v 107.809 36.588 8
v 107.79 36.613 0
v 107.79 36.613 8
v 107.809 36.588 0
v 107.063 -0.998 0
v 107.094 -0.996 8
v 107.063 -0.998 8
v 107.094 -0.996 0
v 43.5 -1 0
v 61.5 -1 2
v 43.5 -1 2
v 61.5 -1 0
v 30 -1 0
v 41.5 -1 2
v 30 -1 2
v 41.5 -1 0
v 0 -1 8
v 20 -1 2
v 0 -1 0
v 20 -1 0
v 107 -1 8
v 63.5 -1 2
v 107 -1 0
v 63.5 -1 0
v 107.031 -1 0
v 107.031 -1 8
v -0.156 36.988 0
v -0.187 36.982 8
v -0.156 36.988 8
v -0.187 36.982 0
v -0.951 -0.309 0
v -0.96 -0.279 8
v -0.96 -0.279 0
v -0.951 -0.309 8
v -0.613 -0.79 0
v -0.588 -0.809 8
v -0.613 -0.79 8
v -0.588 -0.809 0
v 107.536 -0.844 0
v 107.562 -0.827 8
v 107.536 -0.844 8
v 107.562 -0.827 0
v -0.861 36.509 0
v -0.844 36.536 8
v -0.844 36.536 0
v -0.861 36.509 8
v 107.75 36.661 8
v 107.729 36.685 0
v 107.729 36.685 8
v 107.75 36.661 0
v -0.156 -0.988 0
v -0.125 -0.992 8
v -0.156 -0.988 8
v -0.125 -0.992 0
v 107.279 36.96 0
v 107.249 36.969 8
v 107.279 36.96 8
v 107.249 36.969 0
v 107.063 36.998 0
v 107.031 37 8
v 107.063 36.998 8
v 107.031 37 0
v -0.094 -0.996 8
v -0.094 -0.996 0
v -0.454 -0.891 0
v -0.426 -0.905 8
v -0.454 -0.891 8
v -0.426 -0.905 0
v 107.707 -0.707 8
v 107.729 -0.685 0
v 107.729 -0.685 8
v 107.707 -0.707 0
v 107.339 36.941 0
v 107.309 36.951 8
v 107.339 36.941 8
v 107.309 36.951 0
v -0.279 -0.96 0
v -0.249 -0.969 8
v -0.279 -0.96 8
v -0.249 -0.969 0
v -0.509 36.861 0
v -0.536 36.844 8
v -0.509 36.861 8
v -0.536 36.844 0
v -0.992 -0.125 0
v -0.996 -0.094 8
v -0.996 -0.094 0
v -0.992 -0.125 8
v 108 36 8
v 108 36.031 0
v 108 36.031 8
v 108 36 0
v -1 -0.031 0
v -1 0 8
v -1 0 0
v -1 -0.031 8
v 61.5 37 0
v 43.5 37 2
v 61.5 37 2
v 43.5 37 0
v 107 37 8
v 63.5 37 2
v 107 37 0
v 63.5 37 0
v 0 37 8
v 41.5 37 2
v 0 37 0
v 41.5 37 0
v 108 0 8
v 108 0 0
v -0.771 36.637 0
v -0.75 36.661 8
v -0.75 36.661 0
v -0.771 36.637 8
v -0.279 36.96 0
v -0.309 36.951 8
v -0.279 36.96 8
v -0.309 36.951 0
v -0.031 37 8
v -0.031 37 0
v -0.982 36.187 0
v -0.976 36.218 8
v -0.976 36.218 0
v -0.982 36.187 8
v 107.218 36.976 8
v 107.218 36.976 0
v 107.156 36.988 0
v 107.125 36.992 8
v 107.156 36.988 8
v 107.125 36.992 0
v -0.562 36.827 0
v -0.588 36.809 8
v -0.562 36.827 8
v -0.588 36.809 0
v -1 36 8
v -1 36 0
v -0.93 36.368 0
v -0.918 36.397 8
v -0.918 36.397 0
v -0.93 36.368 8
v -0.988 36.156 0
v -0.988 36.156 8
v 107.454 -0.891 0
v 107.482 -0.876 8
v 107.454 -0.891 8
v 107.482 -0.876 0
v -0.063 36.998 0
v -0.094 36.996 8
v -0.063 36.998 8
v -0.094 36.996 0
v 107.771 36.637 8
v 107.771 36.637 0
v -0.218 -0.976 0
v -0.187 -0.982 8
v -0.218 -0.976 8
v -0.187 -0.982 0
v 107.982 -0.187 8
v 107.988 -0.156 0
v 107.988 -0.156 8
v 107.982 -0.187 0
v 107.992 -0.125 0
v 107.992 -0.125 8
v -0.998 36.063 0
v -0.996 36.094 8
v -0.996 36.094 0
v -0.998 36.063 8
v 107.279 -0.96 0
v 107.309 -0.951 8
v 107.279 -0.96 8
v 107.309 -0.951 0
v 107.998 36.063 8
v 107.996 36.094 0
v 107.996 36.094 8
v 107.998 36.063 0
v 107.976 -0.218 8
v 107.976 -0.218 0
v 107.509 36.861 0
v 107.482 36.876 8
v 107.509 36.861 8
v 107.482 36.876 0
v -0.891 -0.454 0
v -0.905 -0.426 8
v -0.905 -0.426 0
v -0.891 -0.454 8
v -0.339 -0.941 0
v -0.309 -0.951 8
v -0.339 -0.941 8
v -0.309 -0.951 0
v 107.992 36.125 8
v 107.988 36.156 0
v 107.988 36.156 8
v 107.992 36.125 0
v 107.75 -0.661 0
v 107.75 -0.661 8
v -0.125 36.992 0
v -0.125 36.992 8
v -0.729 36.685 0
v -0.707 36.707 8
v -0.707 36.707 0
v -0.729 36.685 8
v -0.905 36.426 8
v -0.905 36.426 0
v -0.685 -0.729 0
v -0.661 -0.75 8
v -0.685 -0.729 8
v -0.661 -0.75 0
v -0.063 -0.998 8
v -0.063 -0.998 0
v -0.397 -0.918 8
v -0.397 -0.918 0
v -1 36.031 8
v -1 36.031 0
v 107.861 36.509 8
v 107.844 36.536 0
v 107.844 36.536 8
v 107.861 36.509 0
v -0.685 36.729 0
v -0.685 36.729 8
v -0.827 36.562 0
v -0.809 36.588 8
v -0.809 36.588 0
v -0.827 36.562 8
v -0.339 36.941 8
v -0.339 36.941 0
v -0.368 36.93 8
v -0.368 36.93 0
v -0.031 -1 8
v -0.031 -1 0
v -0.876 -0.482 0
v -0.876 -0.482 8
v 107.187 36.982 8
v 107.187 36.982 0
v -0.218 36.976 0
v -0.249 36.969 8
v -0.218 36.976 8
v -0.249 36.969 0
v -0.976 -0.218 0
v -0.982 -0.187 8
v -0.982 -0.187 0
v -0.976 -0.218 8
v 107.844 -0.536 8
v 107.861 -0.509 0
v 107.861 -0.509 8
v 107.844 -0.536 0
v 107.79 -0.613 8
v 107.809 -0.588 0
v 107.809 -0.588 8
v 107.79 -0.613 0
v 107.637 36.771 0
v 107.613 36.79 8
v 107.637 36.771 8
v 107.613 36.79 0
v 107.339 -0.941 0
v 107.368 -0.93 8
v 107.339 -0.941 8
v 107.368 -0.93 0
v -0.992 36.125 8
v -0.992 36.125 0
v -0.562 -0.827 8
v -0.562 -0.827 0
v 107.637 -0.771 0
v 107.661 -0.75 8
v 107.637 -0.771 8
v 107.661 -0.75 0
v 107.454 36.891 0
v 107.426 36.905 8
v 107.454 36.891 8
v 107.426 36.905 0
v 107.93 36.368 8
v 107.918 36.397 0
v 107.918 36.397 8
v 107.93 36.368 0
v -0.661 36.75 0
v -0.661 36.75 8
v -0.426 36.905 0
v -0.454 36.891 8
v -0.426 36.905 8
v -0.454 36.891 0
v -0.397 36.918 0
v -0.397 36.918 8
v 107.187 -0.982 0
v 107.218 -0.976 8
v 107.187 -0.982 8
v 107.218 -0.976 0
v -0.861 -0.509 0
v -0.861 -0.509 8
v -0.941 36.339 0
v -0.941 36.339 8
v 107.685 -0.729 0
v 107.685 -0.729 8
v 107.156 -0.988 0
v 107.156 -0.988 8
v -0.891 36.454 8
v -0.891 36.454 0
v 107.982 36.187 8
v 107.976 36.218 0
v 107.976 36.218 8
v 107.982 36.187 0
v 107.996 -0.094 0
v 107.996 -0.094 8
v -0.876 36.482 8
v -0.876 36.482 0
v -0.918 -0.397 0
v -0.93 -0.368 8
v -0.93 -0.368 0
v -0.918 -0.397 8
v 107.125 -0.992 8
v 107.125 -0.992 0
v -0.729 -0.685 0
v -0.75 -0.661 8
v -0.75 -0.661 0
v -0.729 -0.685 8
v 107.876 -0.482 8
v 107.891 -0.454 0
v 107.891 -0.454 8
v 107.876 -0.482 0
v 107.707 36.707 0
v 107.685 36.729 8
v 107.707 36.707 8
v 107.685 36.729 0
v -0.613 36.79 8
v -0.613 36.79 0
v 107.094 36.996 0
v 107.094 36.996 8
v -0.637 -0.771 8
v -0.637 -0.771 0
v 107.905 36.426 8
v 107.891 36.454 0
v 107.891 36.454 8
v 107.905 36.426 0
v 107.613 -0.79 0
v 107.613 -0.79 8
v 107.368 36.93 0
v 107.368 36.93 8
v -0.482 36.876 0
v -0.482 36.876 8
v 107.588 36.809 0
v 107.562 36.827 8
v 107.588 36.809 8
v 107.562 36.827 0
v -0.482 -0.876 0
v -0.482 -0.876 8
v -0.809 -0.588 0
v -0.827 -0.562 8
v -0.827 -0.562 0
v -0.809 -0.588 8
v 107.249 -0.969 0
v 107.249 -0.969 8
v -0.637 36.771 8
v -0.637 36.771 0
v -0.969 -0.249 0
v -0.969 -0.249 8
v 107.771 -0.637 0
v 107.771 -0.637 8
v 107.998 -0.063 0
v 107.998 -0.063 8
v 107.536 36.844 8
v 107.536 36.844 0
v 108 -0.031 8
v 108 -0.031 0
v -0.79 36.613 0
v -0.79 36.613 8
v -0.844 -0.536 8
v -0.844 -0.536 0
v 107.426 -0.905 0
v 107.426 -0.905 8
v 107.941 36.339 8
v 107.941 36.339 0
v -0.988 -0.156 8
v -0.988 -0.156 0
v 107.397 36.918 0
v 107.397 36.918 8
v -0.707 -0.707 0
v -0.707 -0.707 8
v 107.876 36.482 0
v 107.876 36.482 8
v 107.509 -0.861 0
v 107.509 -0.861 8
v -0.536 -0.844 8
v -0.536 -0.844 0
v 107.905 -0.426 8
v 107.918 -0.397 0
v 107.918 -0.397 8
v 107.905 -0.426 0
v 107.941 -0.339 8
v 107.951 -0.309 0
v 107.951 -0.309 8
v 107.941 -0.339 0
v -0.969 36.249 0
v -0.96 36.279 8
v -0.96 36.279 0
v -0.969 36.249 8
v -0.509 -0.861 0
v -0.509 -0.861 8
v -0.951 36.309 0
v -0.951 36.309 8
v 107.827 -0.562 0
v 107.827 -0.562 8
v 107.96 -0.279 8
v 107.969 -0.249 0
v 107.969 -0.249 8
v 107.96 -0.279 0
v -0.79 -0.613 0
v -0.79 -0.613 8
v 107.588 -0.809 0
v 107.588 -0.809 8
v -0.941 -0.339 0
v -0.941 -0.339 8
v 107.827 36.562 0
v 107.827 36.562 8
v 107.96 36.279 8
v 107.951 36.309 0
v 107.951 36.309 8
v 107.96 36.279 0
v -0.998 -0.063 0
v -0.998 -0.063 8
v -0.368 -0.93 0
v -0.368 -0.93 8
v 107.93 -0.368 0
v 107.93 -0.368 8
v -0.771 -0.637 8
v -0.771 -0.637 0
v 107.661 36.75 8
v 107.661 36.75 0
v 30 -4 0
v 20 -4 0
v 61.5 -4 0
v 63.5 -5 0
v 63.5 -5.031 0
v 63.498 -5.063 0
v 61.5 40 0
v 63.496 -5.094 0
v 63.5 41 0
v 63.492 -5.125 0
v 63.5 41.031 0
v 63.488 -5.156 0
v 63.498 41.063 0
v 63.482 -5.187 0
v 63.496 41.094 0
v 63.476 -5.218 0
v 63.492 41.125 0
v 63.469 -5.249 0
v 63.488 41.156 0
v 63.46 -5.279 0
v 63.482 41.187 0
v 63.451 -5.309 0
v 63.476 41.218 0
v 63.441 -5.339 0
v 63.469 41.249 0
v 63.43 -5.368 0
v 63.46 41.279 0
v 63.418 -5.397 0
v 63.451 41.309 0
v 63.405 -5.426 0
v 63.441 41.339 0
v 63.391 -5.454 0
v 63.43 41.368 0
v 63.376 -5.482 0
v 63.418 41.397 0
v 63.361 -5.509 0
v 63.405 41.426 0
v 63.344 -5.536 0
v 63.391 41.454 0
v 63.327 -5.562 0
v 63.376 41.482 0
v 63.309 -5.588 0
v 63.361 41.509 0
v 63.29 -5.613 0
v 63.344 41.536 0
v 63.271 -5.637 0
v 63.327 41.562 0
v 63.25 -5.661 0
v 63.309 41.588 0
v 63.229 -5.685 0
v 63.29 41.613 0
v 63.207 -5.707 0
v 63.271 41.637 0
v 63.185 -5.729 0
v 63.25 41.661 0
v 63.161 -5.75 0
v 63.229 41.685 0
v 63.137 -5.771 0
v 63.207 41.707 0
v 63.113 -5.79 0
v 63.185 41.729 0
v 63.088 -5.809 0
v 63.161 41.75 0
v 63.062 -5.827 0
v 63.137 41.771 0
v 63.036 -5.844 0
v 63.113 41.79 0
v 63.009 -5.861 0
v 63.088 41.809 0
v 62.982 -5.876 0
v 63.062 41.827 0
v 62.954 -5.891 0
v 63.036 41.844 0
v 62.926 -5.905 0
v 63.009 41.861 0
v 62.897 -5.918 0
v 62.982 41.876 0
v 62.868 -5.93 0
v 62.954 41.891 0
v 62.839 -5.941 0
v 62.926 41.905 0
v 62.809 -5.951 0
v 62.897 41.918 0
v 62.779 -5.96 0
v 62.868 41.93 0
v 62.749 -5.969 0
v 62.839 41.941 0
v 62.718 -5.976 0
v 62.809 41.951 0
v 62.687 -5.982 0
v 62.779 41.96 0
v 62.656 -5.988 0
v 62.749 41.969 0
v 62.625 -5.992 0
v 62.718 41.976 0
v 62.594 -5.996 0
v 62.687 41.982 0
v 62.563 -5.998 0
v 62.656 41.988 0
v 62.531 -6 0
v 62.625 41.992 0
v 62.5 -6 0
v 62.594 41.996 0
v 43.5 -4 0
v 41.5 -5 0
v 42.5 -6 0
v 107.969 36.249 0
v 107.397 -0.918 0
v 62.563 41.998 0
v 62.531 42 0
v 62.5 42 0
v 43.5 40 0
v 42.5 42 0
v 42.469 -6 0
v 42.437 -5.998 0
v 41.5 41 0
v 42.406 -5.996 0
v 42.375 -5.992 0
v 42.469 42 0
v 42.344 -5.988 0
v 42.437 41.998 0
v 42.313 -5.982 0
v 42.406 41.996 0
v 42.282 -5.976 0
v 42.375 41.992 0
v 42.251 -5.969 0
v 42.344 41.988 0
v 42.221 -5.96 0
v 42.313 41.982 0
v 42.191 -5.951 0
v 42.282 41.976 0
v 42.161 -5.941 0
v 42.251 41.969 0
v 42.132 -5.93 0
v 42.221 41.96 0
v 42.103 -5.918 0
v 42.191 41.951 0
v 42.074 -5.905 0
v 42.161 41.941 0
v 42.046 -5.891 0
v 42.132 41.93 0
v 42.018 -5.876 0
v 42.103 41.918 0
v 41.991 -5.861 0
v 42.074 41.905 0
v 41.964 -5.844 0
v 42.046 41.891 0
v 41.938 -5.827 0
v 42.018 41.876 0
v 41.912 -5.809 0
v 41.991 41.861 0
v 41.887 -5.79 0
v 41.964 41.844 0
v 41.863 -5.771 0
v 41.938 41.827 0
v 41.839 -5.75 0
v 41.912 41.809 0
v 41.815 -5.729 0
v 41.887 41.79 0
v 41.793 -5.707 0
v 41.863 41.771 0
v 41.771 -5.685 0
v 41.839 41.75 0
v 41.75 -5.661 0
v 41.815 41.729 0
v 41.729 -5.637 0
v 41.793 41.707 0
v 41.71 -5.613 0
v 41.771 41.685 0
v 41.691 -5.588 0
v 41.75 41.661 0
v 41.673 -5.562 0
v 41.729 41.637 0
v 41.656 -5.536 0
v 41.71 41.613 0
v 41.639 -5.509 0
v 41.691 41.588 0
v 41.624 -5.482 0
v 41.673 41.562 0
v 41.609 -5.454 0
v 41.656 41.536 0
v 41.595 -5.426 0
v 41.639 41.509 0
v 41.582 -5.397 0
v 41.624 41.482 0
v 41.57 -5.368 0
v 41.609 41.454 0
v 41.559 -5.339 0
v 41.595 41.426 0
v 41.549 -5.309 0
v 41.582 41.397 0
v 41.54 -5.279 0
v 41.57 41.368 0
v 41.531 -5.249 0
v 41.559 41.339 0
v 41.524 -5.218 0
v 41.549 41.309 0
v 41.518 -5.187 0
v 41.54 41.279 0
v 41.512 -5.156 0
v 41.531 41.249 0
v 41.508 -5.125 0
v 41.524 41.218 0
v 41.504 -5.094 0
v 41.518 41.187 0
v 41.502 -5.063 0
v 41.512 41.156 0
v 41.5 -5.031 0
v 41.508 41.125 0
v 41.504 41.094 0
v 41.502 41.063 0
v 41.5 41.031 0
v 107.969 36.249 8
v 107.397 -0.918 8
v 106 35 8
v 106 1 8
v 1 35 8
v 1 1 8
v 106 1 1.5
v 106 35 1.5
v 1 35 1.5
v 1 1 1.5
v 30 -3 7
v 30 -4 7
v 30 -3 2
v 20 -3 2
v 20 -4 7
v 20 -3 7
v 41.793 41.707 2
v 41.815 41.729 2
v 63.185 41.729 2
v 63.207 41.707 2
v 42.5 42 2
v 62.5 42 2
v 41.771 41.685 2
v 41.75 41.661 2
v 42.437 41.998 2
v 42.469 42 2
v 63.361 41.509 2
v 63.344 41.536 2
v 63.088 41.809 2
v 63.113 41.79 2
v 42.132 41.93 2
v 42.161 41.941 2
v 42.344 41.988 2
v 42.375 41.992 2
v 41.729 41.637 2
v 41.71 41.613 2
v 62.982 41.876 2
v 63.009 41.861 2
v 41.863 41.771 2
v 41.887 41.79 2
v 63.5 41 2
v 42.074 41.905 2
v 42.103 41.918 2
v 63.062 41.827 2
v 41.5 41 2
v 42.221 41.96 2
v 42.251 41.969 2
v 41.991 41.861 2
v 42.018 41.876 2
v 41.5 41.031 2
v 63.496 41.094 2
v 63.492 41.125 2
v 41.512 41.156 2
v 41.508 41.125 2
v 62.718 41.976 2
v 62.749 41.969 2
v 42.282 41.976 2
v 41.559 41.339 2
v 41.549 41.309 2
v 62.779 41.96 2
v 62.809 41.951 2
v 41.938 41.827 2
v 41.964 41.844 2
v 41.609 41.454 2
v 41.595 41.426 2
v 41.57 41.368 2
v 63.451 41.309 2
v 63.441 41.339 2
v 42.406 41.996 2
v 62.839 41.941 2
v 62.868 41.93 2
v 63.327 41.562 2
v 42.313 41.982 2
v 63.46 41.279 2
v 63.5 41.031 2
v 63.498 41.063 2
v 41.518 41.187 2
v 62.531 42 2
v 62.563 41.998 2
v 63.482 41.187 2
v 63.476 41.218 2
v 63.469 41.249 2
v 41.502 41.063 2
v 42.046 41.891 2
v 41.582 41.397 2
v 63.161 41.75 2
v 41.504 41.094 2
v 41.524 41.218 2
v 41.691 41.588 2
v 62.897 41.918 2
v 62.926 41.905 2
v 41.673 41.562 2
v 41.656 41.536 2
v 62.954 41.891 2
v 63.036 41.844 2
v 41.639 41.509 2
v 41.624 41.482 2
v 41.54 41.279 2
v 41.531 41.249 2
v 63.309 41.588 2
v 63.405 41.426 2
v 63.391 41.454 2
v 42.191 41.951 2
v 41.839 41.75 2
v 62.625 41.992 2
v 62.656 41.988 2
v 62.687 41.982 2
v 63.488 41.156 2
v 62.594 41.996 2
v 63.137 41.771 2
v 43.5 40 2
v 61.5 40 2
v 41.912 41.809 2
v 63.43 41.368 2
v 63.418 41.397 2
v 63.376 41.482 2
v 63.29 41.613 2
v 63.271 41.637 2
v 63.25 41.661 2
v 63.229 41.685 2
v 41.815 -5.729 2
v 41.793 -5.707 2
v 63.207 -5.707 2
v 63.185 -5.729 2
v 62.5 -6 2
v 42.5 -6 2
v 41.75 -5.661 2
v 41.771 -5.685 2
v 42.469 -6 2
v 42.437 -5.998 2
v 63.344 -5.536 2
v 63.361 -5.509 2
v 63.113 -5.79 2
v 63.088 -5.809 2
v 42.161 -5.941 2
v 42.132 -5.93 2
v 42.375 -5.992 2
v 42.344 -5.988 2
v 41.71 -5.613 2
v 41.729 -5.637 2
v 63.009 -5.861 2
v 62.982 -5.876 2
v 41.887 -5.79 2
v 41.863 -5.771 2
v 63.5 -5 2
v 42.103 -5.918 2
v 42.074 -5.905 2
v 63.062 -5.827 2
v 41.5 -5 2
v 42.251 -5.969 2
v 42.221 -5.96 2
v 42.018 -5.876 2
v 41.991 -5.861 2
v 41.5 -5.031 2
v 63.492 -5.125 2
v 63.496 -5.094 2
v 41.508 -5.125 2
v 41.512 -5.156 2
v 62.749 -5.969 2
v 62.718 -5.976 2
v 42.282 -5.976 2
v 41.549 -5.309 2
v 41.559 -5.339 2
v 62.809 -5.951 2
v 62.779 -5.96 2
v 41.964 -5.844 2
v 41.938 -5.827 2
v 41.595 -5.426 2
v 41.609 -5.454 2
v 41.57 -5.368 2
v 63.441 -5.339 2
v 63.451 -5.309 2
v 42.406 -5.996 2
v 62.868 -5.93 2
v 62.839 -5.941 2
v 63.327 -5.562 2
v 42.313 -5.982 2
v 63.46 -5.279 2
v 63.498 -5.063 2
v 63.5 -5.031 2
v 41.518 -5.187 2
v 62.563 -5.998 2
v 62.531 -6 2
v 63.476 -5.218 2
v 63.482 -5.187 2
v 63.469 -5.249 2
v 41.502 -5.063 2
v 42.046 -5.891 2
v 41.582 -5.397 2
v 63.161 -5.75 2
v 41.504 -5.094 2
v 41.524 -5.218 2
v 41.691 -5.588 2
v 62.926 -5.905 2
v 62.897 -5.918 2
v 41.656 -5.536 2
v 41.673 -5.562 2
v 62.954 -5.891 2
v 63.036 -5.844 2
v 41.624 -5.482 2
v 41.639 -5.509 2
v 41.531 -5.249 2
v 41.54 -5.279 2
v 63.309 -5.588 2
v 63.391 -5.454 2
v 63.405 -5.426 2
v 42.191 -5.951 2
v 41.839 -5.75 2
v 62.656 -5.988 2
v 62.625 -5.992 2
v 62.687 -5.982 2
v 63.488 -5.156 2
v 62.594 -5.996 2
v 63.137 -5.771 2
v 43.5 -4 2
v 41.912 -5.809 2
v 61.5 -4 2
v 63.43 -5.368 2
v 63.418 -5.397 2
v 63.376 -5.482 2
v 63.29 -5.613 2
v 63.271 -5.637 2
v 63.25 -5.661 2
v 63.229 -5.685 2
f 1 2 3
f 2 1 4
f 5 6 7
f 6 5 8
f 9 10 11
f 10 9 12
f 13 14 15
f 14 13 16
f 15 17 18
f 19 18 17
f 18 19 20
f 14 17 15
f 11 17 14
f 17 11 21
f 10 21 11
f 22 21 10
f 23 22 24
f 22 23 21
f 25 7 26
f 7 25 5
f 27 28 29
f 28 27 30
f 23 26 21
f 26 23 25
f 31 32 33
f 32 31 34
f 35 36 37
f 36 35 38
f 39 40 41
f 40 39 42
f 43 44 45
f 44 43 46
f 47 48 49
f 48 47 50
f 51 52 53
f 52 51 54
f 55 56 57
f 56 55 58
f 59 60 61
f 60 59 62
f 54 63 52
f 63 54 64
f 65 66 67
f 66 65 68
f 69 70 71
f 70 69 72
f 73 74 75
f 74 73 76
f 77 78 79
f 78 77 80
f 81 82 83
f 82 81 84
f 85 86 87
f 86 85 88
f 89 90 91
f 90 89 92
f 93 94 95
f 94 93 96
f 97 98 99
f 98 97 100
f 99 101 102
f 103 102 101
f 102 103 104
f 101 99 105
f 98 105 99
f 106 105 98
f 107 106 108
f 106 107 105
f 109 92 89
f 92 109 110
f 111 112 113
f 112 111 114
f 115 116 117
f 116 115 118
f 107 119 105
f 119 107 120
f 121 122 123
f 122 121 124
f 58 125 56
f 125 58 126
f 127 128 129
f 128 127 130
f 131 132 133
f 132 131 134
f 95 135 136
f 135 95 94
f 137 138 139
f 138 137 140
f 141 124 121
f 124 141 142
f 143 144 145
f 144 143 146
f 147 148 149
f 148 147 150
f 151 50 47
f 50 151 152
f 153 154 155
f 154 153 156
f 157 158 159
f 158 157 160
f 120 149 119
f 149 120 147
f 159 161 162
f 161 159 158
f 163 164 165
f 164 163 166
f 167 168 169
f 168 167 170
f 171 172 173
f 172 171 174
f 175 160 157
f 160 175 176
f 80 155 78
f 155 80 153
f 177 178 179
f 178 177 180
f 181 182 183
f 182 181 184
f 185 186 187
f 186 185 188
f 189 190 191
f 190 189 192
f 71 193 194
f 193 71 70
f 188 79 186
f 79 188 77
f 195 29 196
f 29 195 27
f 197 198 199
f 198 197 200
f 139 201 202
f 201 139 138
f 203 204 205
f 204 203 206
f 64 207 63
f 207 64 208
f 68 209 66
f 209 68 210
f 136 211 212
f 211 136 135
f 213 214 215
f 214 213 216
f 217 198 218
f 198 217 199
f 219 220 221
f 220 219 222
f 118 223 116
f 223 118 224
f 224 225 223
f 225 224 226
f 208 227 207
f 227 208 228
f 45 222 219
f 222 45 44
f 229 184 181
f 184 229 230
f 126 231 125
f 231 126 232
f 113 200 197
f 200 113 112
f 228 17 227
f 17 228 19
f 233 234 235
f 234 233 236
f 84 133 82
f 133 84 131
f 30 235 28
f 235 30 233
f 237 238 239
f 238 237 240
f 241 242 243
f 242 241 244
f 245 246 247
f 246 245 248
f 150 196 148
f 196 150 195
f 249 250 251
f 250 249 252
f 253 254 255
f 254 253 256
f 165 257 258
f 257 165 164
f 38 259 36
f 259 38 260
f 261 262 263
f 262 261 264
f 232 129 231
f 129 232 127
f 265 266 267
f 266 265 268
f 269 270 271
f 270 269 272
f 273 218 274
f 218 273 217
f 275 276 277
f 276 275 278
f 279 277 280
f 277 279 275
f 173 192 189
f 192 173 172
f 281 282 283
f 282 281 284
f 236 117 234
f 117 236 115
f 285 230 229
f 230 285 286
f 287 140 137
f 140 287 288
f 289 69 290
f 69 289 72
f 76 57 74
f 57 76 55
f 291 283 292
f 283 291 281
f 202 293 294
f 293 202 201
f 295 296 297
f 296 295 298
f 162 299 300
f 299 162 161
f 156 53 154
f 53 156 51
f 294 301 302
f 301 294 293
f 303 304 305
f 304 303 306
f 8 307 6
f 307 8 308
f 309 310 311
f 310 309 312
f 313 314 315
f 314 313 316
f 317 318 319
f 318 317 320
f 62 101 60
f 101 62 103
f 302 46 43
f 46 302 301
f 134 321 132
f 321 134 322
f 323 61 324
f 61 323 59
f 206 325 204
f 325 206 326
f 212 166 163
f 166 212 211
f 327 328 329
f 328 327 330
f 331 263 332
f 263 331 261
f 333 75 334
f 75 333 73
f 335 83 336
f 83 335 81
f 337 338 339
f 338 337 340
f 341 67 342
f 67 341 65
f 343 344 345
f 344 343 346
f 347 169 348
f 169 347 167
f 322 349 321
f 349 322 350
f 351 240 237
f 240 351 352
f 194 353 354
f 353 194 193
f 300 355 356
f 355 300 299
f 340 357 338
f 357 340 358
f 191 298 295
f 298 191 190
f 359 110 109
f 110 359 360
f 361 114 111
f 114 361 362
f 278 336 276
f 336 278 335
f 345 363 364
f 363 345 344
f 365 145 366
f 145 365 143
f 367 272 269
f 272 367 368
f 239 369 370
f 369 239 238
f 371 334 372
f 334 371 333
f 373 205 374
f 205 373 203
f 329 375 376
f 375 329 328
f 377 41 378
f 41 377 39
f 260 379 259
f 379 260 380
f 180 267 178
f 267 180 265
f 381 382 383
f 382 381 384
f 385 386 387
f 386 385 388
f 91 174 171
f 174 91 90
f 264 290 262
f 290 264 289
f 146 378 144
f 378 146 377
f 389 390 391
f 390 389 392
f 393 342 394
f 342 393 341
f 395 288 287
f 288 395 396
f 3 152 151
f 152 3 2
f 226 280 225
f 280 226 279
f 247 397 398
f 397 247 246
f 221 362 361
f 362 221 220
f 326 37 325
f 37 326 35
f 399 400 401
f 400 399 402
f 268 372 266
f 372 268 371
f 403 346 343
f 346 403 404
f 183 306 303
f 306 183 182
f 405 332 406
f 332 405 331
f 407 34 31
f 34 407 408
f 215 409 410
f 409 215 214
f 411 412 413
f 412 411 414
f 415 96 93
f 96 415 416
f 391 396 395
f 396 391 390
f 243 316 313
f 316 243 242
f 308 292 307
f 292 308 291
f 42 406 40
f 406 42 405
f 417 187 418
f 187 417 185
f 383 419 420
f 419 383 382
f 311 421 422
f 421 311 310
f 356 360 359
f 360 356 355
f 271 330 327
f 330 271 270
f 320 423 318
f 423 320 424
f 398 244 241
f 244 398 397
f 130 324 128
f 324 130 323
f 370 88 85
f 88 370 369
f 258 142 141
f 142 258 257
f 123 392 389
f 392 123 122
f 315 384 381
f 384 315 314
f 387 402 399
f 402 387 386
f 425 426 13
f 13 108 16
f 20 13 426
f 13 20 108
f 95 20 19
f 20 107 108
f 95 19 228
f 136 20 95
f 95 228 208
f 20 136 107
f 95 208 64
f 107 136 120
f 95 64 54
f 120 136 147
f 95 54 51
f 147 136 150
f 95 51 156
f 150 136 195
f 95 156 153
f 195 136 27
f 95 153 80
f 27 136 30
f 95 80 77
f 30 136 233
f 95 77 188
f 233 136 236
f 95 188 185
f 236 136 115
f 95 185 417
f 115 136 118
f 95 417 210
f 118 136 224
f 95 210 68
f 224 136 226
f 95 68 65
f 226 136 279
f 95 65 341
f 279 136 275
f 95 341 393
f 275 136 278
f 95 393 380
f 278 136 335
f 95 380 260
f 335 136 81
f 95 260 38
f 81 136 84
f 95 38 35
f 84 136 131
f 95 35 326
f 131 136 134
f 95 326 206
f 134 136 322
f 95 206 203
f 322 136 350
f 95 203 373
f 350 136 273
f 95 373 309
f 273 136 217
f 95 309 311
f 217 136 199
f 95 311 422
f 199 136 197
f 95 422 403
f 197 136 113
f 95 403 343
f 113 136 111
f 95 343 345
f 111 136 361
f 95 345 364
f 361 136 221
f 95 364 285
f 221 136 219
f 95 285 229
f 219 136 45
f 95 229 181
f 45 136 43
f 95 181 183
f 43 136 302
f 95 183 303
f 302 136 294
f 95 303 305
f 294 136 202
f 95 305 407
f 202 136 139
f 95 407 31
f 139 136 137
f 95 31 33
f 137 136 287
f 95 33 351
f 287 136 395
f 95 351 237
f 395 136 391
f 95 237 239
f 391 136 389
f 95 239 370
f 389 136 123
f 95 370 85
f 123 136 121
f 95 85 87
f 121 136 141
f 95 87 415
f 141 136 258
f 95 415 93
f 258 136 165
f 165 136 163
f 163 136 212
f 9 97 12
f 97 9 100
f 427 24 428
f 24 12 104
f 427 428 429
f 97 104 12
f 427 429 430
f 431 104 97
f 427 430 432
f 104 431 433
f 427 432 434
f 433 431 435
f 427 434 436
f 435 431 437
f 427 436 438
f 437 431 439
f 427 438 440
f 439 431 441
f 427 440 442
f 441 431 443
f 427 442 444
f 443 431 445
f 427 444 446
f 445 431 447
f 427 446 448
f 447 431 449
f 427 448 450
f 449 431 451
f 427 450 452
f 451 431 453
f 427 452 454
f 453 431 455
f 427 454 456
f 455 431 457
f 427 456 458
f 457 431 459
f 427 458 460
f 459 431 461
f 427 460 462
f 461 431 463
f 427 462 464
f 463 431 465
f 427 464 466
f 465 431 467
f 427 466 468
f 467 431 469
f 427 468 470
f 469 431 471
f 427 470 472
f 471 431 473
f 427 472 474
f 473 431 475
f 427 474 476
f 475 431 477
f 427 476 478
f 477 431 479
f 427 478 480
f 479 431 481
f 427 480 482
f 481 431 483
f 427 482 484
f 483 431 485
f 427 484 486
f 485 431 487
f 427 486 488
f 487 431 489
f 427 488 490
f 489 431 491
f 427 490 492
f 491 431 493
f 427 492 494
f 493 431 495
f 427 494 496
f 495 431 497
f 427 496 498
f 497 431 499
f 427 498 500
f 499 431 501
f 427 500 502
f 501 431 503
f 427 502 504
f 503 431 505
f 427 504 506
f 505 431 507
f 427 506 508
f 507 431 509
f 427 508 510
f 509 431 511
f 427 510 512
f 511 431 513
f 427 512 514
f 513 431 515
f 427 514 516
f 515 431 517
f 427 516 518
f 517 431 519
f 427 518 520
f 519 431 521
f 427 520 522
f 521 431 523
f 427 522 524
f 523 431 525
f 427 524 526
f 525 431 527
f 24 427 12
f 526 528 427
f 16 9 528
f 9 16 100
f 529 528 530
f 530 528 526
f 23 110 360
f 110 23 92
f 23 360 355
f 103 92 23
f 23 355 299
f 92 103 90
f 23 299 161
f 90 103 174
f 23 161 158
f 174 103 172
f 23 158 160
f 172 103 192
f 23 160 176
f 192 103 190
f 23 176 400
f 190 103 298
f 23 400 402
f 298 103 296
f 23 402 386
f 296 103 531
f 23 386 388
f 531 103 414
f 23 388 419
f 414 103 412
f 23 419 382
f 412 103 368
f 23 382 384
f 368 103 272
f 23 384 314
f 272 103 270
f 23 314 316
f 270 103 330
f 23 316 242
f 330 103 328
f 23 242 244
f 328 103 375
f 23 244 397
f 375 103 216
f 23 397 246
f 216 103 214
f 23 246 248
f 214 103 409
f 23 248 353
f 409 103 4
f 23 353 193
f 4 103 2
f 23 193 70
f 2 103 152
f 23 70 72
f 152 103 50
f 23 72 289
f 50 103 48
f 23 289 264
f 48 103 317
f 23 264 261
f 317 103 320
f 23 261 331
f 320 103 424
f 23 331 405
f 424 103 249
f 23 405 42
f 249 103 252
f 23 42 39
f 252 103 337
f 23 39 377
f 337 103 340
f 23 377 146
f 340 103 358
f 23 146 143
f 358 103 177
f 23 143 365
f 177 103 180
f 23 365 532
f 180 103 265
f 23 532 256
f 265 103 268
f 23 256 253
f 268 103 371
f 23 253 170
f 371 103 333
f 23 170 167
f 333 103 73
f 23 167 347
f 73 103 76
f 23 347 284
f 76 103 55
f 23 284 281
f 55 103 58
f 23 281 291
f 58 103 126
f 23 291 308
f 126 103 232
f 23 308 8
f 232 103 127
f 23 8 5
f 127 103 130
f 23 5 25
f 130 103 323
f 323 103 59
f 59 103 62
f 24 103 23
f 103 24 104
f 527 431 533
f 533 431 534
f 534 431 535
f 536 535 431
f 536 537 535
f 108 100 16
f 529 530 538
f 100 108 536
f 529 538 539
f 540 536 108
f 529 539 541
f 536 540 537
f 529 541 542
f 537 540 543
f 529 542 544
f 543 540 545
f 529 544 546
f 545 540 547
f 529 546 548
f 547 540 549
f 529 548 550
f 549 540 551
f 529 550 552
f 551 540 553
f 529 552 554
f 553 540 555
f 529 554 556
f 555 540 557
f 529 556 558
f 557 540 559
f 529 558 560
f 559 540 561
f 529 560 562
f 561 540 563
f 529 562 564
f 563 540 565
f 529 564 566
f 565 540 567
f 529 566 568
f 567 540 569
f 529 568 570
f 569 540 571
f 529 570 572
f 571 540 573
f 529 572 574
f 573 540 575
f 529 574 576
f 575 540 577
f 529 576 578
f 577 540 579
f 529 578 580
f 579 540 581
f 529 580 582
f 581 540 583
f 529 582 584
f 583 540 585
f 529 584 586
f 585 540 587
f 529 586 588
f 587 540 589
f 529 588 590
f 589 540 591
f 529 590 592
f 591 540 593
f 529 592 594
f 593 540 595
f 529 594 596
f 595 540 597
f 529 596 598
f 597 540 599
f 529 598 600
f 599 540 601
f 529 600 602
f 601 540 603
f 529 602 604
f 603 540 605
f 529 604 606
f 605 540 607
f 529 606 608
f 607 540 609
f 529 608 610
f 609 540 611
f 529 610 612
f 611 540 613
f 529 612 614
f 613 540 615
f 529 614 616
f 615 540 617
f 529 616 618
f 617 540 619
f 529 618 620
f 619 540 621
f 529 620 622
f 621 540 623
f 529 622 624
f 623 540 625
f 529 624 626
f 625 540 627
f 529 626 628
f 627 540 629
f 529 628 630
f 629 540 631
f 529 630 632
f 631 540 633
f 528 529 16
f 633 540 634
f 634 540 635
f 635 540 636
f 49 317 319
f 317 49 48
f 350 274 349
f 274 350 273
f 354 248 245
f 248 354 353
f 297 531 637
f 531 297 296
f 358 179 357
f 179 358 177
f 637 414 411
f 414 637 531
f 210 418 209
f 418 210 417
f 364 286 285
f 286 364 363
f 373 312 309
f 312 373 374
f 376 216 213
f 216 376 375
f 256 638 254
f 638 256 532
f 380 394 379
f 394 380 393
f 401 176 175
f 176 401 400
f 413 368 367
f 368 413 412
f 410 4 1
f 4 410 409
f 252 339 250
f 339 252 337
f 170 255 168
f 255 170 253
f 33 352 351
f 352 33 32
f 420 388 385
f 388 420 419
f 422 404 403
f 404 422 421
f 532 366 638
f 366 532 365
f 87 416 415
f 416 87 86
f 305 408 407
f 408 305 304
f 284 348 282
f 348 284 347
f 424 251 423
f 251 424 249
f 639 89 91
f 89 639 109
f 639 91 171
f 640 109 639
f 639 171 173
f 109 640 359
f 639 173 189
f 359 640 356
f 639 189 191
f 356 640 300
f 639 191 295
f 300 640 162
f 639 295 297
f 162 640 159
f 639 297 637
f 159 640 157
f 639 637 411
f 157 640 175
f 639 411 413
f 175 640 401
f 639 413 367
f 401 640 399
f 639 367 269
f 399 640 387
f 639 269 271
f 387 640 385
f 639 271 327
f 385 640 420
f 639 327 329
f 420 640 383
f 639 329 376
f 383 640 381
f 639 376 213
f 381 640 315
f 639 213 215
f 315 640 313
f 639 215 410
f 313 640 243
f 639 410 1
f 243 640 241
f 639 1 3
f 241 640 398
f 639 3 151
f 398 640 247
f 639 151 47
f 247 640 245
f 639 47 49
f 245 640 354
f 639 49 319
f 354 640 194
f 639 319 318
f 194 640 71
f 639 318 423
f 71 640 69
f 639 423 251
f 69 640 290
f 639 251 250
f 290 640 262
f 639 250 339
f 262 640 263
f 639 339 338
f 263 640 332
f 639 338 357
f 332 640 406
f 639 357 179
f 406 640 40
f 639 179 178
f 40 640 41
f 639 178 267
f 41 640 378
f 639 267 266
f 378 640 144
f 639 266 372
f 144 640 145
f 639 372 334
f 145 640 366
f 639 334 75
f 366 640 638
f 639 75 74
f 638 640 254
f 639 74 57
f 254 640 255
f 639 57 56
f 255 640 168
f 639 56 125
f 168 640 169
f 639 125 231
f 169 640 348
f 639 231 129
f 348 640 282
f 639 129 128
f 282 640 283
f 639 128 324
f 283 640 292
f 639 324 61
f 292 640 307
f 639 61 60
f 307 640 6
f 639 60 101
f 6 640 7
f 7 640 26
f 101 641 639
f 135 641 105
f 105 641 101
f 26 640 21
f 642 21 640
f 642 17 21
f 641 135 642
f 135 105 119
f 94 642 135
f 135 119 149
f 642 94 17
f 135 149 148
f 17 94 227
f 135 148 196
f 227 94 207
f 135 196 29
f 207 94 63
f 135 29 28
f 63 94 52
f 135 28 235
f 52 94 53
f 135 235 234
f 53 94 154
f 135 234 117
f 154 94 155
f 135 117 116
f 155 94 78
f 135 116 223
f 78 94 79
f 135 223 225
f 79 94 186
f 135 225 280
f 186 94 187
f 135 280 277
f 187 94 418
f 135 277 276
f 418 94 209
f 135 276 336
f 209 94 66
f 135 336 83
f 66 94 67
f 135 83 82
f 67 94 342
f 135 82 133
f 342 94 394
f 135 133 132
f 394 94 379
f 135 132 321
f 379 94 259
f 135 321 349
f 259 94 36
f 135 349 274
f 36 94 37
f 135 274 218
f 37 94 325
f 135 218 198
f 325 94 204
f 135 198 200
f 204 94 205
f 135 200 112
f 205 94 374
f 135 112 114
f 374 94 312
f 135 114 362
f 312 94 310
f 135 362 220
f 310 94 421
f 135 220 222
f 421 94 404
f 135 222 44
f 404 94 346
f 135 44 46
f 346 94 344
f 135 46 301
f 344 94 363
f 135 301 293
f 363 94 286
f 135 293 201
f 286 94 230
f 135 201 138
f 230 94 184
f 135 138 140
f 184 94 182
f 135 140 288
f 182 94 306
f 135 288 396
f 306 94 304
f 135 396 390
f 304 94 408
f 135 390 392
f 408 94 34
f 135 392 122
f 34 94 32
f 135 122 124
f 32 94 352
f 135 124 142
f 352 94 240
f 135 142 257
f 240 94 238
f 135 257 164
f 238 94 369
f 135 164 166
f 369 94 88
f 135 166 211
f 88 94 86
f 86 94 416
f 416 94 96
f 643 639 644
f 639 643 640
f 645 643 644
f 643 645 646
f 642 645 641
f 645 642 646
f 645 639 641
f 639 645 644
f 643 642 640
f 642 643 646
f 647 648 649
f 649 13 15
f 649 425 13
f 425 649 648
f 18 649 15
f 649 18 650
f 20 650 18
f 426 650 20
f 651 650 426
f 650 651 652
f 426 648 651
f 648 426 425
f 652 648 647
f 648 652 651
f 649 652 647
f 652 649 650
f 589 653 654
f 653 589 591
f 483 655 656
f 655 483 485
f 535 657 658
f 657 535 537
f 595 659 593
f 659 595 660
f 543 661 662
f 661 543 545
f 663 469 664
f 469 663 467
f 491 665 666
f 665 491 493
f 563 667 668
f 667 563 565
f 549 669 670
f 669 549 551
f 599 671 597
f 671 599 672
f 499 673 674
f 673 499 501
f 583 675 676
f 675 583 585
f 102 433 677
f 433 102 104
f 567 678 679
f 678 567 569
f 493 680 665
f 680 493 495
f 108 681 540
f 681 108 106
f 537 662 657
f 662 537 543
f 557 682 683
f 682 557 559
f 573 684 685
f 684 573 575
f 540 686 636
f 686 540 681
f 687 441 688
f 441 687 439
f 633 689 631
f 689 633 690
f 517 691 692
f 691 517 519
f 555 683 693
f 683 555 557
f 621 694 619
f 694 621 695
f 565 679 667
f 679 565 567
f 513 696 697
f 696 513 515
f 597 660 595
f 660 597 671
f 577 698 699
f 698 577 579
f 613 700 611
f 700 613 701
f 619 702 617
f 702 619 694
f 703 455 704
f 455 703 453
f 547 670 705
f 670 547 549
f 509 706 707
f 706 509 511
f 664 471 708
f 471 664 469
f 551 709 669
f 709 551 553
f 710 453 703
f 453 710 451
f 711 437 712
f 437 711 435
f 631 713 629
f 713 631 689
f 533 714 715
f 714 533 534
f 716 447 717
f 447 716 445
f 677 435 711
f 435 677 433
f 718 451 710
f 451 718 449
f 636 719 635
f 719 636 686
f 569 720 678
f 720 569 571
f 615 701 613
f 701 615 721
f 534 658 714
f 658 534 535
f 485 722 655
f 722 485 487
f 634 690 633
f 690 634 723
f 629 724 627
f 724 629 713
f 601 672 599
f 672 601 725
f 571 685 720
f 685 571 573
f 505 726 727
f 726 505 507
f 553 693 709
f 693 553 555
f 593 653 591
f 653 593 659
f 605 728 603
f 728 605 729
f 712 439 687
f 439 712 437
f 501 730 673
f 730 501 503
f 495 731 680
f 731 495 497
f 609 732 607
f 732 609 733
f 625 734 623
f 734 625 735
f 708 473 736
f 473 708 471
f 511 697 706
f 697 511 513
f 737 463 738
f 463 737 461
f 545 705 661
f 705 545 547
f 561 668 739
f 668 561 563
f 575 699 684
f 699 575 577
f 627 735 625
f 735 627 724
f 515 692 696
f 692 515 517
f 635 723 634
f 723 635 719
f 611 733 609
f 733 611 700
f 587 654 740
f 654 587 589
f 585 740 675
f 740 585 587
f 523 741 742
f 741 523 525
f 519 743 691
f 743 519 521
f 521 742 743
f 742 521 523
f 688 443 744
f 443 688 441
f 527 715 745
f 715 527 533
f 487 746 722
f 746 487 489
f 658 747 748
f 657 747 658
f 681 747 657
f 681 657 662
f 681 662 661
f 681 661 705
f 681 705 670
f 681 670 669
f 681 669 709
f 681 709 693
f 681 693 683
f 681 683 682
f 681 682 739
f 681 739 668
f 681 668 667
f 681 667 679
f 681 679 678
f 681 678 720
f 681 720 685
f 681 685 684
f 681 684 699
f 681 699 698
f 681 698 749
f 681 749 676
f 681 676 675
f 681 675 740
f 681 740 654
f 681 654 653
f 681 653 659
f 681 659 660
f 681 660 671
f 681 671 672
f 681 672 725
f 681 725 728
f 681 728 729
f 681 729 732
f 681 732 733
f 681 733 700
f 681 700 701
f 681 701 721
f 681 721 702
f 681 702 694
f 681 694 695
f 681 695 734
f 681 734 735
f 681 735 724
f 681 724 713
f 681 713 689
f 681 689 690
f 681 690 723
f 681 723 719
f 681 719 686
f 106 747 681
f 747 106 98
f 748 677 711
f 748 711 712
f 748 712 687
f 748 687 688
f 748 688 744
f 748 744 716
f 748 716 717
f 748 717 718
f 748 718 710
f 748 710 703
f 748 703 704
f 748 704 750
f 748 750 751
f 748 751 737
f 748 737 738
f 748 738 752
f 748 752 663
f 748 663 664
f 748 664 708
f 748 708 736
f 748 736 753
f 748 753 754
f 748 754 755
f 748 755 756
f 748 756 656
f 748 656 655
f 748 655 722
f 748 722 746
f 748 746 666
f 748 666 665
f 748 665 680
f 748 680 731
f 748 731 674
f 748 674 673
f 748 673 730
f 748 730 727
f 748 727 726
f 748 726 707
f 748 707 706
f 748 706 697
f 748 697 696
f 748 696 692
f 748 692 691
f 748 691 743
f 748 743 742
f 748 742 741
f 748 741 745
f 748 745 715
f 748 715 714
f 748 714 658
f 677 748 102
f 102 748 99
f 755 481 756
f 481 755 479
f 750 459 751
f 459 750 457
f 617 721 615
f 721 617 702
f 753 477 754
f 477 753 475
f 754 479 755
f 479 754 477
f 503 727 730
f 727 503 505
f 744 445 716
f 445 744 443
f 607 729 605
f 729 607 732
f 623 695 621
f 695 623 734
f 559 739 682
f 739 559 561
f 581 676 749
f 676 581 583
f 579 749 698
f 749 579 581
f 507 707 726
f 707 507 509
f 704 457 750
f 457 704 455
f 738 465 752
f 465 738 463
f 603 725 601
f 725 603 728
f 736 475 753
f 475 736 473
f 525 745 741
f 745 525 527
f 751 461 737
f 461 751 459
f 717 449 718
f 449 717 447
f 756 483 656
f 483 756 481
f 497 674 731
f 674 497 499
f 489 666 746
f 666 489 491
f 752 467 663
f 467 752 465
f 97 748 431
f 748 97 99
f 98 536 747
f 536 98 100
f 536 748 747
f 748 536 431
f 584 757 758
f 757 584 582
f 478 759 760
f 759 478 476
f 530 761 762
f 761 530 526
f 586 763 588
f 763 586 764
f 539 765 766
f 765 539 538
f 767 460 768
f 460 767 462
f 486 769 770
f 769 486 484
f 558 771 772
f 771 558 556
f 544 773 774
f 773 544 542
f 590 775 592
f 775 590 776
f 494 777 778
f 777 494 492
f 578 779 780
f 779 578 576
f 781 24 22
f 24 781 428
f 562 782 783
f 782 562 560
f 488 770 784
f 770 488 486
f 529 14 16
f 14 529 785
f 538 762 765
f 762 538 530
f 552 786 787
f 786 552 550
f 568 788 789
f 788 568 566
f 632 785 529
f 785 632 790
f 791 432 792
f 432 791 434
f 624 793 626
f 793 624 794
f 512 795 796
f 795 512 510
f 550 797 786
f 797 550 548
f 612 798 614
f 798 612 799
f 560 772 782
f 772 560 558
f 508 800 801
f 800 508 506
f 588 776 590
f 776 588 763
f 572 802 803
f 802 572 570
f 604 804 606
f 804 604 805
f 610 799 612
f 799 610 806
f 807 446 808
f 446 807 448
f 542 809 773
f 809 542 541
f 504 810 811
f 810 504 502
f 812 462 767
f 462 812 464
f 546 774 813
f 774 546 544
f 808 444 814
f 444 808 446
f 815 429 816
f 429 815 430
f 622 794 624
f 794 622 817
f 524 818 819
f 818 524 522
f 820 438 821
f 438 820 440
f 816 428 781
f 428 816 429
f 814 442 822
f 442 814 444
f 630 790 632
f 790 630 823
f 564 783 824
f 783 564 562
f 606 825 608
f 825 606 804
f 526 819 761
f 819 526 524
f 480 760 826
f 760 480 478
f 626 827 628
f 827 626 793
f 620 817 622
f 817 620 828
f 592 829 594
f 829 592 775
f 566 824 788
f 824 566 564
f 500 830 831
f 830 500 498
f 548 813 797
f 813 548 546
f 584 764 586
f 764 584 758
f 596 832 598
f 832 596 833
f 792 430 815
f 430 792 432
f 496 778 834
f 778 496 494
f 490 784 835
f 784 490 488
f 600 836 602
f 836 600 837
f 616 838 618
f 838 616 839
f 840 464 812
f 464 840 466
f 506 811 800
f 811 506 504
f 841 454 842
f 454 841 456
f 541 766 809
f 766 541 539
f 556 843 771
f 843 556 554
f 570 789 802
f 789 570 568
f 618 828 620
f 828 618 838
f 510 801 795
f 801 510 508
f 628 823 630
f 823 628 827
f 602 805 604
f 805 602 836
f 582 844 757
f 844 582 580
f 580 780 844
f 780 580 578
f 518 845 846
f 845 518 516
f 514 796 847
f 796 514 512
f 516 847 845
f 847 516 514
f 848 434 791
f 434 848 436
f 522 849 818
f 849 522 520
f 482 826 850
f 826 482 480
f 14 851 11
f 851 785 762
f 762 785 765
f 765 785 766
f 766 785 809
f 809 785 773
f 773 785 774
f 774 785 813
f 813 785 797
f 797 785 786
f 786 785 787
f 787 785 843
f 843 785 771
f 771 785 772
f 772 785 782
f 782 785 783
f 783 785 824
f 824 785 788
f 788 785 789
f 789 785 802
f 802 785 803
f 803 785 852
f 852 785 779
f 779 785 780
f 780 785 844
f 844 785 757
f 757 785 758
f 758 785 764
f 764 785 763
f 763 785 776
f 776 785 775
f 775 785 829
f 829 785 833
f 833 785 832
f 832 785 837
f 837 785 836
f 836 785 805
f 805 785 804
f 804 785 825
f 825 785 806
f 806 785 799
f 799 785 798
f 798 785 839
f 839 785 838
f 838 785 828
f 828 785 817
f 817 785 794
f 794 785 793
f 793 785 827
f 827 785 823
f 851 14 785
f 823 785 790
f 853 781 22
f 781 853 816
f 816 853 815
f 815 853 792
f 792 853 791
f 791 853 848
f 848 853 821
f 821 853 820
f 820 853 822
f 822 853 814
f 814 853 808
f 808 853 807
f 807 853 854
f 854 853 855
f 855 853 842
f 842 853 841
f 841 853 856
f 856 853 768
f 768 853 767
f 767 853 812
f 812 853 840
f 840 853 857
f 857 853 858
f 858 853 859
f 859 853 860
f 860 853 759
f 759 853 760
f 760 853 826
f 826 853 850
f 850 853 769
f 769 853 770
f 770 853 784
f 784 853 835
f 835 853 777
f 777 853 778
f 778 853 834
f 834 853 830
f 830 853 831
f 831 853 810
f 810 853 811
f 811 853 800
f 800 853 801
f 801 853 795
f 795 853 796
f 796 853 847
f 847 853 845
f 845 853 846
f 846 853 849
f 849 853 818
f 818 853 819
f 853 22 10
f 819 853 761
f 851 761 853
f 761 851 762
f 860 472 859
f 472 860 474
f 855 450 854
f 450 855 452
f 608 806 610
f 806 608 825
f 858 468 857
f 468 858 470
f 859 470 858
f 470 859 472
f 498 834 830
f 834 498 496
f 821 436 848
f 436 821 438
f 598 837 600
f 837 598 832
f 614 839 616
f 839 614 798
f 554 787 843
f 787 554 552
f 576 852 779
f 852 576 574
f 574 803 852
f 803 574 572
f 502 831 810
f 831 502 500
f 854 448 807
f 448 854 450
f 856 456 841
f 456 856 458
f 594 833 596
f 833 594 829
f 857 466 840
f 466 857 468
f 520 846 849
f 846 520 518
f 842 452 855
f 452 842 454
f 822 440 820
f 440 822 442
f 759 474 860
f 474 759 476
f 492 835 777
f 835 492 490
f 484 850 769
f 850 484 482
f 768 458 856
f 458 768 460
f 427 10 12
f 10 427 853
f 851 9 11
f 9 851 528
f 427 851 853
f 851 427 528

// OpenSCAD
/* Quadcopter battery protector: reduce the rate at which you burn through batteries :-)

  Copyright 2018 Lluis Mora

  Redistribution and use in source and binary forms, with or without modification, are permitted provided that the following conditions are met:

  1. Redistributions of source code must retain the above copyright notice, this list of conditions and the following disclaimer.

  2. Redistributions in binary form must reproduce the above copyright notice, this list of conditions and the following disclaimer in the documentation and/or other materials provided with the distribution.

  THIS SOFTWARE IS PROVIDED BY THE COPYRIGHT HOLDERS AND CONTRIBUTORS "AS IS" AND ANY EXPRESS OR IMPLIED WARRANTIES, INCLUDING, BUT NOT LIMITED TO, THE IMPLIED WARRANTIES OF MERCHANTABILITY AND FITNESS FOR A PARTICULAR PURPOSE ARE DISCLAIMED. IN NO EVENT SHALL THE COPYRIGHT HOLDER OR CONTRIBUTORS BE LIABLE FOR ANY DIRECT, INDIRECT, INCIDENTAL, SPECIAL, EXEMPLARY, OR CONSEQUENTIAL DAMAGES (INCLUDING, BUT NOT LIMITED TO, PROCUREMENT OF SUBSTITUTE GOODS OR SERVICES; LOSS OF USE, DATA, OR PROFITS; OR BUSINESS INTERRUPTION) HOWEVER CAUSED AND ON ANY THEORY OF LIABILITY, WHETHER IN CONTRACT, STRICT LIABILITY, OR TORT (INCLUDING NEGLIGENCE OR OTHERWISE) ARISING IN ANY WAY OUT OF THE USE OF THIS SOFTWARE, EVEN IF ADVISED OF THE POSSIBILITY OF SUCH DAMAGE.
*/

// Parameters

// Battery length in mm
battery_length = 105;

// Battery width in mm
battery_width = 34;

/*
 Battery sizes:

 - Turnigy 2200mAh 3S: 105 x 34
 - Turnigy 5000mAh 3S: 144 x 50
*/

module ignoretherestofvariables() {}

$fn = 200;

// All sizes in mm

// Fixed values
protector_height = 8;
protector_thickness_bottom = 1.5;
protector_thickness_walls = 1;
balancer_clip_distance = 20;
balancer_clip_width = 10;
balancer_clip_interior_space = 2;
strapholder_width = 20;
strapholder_interior_space = 2;

// Strap holders

module strapholder(width, wall_thickness, interior_space) {
  difference() {
      linear_extrude(height = 2 * wall_thickness)
        offset(wall_thickness) square([width, interior_space + 3 * wall_thickness]);

      translate([wall_thickness, -1 * wall_thickness, -wall_thickness]) {
        cube([width - 2 * wall_thickness, interior_space + 3 * wall_thickness, 4 * wall_thickness]);
      }

    translate([-width, -2 * wall_thickness, -wall_thickness]) {
      cube([3 * width, wall_thickness * 3, 4 * wall_thickness]);
    }
  }
}

module clip(width, wall_thickness, interior_space) {
  cube([width, interior_space + wall_thickness, 2 * wall_thickness]);

  translate([0, interior_space, 0]) {
    cube([width, wall_thickness, protector_height - protector_thickness_walls]);
  }
}

// Base and build

difference() {

  linear_extrude(height = protector_height)
    offset(protector_thickness_walls) square([battery_length + (2 * protector_thickness_walls), battery_width + (2 * protector_thickness_walls)]);

  translate([protector_thickness_walls, protector_thickness_walls, protector_thickness_bottom]) {
    cube(size = [battery_length, battery_width, protector_height]);
  }
}

// Balancer clip, on the left side
translate([balancer_clip_distance, -protector_thickness_walls, 0]) {
  mirror([0,1,0]) clip(balancer_clip_width, protector_thickness_walls, balancer_clip_interior_space);
}

// Strap holders
translate([(battery_length/2) - (strapholder_width/2), battery_width + 2 * protector_thickness_walls , 0]) {
 strapholder(strapholder_width, protector_thickness_walls, strapholder_interior_space);
}

translate([(battery_length/2) - (strapholder_width/2), -(protector_thickness_walls - protector_thickness_walls), 0]) {
 mirror([0,1,0])strapholder(strapholder_width, protector_thickness_walls, strapholder_interior_space);
}
